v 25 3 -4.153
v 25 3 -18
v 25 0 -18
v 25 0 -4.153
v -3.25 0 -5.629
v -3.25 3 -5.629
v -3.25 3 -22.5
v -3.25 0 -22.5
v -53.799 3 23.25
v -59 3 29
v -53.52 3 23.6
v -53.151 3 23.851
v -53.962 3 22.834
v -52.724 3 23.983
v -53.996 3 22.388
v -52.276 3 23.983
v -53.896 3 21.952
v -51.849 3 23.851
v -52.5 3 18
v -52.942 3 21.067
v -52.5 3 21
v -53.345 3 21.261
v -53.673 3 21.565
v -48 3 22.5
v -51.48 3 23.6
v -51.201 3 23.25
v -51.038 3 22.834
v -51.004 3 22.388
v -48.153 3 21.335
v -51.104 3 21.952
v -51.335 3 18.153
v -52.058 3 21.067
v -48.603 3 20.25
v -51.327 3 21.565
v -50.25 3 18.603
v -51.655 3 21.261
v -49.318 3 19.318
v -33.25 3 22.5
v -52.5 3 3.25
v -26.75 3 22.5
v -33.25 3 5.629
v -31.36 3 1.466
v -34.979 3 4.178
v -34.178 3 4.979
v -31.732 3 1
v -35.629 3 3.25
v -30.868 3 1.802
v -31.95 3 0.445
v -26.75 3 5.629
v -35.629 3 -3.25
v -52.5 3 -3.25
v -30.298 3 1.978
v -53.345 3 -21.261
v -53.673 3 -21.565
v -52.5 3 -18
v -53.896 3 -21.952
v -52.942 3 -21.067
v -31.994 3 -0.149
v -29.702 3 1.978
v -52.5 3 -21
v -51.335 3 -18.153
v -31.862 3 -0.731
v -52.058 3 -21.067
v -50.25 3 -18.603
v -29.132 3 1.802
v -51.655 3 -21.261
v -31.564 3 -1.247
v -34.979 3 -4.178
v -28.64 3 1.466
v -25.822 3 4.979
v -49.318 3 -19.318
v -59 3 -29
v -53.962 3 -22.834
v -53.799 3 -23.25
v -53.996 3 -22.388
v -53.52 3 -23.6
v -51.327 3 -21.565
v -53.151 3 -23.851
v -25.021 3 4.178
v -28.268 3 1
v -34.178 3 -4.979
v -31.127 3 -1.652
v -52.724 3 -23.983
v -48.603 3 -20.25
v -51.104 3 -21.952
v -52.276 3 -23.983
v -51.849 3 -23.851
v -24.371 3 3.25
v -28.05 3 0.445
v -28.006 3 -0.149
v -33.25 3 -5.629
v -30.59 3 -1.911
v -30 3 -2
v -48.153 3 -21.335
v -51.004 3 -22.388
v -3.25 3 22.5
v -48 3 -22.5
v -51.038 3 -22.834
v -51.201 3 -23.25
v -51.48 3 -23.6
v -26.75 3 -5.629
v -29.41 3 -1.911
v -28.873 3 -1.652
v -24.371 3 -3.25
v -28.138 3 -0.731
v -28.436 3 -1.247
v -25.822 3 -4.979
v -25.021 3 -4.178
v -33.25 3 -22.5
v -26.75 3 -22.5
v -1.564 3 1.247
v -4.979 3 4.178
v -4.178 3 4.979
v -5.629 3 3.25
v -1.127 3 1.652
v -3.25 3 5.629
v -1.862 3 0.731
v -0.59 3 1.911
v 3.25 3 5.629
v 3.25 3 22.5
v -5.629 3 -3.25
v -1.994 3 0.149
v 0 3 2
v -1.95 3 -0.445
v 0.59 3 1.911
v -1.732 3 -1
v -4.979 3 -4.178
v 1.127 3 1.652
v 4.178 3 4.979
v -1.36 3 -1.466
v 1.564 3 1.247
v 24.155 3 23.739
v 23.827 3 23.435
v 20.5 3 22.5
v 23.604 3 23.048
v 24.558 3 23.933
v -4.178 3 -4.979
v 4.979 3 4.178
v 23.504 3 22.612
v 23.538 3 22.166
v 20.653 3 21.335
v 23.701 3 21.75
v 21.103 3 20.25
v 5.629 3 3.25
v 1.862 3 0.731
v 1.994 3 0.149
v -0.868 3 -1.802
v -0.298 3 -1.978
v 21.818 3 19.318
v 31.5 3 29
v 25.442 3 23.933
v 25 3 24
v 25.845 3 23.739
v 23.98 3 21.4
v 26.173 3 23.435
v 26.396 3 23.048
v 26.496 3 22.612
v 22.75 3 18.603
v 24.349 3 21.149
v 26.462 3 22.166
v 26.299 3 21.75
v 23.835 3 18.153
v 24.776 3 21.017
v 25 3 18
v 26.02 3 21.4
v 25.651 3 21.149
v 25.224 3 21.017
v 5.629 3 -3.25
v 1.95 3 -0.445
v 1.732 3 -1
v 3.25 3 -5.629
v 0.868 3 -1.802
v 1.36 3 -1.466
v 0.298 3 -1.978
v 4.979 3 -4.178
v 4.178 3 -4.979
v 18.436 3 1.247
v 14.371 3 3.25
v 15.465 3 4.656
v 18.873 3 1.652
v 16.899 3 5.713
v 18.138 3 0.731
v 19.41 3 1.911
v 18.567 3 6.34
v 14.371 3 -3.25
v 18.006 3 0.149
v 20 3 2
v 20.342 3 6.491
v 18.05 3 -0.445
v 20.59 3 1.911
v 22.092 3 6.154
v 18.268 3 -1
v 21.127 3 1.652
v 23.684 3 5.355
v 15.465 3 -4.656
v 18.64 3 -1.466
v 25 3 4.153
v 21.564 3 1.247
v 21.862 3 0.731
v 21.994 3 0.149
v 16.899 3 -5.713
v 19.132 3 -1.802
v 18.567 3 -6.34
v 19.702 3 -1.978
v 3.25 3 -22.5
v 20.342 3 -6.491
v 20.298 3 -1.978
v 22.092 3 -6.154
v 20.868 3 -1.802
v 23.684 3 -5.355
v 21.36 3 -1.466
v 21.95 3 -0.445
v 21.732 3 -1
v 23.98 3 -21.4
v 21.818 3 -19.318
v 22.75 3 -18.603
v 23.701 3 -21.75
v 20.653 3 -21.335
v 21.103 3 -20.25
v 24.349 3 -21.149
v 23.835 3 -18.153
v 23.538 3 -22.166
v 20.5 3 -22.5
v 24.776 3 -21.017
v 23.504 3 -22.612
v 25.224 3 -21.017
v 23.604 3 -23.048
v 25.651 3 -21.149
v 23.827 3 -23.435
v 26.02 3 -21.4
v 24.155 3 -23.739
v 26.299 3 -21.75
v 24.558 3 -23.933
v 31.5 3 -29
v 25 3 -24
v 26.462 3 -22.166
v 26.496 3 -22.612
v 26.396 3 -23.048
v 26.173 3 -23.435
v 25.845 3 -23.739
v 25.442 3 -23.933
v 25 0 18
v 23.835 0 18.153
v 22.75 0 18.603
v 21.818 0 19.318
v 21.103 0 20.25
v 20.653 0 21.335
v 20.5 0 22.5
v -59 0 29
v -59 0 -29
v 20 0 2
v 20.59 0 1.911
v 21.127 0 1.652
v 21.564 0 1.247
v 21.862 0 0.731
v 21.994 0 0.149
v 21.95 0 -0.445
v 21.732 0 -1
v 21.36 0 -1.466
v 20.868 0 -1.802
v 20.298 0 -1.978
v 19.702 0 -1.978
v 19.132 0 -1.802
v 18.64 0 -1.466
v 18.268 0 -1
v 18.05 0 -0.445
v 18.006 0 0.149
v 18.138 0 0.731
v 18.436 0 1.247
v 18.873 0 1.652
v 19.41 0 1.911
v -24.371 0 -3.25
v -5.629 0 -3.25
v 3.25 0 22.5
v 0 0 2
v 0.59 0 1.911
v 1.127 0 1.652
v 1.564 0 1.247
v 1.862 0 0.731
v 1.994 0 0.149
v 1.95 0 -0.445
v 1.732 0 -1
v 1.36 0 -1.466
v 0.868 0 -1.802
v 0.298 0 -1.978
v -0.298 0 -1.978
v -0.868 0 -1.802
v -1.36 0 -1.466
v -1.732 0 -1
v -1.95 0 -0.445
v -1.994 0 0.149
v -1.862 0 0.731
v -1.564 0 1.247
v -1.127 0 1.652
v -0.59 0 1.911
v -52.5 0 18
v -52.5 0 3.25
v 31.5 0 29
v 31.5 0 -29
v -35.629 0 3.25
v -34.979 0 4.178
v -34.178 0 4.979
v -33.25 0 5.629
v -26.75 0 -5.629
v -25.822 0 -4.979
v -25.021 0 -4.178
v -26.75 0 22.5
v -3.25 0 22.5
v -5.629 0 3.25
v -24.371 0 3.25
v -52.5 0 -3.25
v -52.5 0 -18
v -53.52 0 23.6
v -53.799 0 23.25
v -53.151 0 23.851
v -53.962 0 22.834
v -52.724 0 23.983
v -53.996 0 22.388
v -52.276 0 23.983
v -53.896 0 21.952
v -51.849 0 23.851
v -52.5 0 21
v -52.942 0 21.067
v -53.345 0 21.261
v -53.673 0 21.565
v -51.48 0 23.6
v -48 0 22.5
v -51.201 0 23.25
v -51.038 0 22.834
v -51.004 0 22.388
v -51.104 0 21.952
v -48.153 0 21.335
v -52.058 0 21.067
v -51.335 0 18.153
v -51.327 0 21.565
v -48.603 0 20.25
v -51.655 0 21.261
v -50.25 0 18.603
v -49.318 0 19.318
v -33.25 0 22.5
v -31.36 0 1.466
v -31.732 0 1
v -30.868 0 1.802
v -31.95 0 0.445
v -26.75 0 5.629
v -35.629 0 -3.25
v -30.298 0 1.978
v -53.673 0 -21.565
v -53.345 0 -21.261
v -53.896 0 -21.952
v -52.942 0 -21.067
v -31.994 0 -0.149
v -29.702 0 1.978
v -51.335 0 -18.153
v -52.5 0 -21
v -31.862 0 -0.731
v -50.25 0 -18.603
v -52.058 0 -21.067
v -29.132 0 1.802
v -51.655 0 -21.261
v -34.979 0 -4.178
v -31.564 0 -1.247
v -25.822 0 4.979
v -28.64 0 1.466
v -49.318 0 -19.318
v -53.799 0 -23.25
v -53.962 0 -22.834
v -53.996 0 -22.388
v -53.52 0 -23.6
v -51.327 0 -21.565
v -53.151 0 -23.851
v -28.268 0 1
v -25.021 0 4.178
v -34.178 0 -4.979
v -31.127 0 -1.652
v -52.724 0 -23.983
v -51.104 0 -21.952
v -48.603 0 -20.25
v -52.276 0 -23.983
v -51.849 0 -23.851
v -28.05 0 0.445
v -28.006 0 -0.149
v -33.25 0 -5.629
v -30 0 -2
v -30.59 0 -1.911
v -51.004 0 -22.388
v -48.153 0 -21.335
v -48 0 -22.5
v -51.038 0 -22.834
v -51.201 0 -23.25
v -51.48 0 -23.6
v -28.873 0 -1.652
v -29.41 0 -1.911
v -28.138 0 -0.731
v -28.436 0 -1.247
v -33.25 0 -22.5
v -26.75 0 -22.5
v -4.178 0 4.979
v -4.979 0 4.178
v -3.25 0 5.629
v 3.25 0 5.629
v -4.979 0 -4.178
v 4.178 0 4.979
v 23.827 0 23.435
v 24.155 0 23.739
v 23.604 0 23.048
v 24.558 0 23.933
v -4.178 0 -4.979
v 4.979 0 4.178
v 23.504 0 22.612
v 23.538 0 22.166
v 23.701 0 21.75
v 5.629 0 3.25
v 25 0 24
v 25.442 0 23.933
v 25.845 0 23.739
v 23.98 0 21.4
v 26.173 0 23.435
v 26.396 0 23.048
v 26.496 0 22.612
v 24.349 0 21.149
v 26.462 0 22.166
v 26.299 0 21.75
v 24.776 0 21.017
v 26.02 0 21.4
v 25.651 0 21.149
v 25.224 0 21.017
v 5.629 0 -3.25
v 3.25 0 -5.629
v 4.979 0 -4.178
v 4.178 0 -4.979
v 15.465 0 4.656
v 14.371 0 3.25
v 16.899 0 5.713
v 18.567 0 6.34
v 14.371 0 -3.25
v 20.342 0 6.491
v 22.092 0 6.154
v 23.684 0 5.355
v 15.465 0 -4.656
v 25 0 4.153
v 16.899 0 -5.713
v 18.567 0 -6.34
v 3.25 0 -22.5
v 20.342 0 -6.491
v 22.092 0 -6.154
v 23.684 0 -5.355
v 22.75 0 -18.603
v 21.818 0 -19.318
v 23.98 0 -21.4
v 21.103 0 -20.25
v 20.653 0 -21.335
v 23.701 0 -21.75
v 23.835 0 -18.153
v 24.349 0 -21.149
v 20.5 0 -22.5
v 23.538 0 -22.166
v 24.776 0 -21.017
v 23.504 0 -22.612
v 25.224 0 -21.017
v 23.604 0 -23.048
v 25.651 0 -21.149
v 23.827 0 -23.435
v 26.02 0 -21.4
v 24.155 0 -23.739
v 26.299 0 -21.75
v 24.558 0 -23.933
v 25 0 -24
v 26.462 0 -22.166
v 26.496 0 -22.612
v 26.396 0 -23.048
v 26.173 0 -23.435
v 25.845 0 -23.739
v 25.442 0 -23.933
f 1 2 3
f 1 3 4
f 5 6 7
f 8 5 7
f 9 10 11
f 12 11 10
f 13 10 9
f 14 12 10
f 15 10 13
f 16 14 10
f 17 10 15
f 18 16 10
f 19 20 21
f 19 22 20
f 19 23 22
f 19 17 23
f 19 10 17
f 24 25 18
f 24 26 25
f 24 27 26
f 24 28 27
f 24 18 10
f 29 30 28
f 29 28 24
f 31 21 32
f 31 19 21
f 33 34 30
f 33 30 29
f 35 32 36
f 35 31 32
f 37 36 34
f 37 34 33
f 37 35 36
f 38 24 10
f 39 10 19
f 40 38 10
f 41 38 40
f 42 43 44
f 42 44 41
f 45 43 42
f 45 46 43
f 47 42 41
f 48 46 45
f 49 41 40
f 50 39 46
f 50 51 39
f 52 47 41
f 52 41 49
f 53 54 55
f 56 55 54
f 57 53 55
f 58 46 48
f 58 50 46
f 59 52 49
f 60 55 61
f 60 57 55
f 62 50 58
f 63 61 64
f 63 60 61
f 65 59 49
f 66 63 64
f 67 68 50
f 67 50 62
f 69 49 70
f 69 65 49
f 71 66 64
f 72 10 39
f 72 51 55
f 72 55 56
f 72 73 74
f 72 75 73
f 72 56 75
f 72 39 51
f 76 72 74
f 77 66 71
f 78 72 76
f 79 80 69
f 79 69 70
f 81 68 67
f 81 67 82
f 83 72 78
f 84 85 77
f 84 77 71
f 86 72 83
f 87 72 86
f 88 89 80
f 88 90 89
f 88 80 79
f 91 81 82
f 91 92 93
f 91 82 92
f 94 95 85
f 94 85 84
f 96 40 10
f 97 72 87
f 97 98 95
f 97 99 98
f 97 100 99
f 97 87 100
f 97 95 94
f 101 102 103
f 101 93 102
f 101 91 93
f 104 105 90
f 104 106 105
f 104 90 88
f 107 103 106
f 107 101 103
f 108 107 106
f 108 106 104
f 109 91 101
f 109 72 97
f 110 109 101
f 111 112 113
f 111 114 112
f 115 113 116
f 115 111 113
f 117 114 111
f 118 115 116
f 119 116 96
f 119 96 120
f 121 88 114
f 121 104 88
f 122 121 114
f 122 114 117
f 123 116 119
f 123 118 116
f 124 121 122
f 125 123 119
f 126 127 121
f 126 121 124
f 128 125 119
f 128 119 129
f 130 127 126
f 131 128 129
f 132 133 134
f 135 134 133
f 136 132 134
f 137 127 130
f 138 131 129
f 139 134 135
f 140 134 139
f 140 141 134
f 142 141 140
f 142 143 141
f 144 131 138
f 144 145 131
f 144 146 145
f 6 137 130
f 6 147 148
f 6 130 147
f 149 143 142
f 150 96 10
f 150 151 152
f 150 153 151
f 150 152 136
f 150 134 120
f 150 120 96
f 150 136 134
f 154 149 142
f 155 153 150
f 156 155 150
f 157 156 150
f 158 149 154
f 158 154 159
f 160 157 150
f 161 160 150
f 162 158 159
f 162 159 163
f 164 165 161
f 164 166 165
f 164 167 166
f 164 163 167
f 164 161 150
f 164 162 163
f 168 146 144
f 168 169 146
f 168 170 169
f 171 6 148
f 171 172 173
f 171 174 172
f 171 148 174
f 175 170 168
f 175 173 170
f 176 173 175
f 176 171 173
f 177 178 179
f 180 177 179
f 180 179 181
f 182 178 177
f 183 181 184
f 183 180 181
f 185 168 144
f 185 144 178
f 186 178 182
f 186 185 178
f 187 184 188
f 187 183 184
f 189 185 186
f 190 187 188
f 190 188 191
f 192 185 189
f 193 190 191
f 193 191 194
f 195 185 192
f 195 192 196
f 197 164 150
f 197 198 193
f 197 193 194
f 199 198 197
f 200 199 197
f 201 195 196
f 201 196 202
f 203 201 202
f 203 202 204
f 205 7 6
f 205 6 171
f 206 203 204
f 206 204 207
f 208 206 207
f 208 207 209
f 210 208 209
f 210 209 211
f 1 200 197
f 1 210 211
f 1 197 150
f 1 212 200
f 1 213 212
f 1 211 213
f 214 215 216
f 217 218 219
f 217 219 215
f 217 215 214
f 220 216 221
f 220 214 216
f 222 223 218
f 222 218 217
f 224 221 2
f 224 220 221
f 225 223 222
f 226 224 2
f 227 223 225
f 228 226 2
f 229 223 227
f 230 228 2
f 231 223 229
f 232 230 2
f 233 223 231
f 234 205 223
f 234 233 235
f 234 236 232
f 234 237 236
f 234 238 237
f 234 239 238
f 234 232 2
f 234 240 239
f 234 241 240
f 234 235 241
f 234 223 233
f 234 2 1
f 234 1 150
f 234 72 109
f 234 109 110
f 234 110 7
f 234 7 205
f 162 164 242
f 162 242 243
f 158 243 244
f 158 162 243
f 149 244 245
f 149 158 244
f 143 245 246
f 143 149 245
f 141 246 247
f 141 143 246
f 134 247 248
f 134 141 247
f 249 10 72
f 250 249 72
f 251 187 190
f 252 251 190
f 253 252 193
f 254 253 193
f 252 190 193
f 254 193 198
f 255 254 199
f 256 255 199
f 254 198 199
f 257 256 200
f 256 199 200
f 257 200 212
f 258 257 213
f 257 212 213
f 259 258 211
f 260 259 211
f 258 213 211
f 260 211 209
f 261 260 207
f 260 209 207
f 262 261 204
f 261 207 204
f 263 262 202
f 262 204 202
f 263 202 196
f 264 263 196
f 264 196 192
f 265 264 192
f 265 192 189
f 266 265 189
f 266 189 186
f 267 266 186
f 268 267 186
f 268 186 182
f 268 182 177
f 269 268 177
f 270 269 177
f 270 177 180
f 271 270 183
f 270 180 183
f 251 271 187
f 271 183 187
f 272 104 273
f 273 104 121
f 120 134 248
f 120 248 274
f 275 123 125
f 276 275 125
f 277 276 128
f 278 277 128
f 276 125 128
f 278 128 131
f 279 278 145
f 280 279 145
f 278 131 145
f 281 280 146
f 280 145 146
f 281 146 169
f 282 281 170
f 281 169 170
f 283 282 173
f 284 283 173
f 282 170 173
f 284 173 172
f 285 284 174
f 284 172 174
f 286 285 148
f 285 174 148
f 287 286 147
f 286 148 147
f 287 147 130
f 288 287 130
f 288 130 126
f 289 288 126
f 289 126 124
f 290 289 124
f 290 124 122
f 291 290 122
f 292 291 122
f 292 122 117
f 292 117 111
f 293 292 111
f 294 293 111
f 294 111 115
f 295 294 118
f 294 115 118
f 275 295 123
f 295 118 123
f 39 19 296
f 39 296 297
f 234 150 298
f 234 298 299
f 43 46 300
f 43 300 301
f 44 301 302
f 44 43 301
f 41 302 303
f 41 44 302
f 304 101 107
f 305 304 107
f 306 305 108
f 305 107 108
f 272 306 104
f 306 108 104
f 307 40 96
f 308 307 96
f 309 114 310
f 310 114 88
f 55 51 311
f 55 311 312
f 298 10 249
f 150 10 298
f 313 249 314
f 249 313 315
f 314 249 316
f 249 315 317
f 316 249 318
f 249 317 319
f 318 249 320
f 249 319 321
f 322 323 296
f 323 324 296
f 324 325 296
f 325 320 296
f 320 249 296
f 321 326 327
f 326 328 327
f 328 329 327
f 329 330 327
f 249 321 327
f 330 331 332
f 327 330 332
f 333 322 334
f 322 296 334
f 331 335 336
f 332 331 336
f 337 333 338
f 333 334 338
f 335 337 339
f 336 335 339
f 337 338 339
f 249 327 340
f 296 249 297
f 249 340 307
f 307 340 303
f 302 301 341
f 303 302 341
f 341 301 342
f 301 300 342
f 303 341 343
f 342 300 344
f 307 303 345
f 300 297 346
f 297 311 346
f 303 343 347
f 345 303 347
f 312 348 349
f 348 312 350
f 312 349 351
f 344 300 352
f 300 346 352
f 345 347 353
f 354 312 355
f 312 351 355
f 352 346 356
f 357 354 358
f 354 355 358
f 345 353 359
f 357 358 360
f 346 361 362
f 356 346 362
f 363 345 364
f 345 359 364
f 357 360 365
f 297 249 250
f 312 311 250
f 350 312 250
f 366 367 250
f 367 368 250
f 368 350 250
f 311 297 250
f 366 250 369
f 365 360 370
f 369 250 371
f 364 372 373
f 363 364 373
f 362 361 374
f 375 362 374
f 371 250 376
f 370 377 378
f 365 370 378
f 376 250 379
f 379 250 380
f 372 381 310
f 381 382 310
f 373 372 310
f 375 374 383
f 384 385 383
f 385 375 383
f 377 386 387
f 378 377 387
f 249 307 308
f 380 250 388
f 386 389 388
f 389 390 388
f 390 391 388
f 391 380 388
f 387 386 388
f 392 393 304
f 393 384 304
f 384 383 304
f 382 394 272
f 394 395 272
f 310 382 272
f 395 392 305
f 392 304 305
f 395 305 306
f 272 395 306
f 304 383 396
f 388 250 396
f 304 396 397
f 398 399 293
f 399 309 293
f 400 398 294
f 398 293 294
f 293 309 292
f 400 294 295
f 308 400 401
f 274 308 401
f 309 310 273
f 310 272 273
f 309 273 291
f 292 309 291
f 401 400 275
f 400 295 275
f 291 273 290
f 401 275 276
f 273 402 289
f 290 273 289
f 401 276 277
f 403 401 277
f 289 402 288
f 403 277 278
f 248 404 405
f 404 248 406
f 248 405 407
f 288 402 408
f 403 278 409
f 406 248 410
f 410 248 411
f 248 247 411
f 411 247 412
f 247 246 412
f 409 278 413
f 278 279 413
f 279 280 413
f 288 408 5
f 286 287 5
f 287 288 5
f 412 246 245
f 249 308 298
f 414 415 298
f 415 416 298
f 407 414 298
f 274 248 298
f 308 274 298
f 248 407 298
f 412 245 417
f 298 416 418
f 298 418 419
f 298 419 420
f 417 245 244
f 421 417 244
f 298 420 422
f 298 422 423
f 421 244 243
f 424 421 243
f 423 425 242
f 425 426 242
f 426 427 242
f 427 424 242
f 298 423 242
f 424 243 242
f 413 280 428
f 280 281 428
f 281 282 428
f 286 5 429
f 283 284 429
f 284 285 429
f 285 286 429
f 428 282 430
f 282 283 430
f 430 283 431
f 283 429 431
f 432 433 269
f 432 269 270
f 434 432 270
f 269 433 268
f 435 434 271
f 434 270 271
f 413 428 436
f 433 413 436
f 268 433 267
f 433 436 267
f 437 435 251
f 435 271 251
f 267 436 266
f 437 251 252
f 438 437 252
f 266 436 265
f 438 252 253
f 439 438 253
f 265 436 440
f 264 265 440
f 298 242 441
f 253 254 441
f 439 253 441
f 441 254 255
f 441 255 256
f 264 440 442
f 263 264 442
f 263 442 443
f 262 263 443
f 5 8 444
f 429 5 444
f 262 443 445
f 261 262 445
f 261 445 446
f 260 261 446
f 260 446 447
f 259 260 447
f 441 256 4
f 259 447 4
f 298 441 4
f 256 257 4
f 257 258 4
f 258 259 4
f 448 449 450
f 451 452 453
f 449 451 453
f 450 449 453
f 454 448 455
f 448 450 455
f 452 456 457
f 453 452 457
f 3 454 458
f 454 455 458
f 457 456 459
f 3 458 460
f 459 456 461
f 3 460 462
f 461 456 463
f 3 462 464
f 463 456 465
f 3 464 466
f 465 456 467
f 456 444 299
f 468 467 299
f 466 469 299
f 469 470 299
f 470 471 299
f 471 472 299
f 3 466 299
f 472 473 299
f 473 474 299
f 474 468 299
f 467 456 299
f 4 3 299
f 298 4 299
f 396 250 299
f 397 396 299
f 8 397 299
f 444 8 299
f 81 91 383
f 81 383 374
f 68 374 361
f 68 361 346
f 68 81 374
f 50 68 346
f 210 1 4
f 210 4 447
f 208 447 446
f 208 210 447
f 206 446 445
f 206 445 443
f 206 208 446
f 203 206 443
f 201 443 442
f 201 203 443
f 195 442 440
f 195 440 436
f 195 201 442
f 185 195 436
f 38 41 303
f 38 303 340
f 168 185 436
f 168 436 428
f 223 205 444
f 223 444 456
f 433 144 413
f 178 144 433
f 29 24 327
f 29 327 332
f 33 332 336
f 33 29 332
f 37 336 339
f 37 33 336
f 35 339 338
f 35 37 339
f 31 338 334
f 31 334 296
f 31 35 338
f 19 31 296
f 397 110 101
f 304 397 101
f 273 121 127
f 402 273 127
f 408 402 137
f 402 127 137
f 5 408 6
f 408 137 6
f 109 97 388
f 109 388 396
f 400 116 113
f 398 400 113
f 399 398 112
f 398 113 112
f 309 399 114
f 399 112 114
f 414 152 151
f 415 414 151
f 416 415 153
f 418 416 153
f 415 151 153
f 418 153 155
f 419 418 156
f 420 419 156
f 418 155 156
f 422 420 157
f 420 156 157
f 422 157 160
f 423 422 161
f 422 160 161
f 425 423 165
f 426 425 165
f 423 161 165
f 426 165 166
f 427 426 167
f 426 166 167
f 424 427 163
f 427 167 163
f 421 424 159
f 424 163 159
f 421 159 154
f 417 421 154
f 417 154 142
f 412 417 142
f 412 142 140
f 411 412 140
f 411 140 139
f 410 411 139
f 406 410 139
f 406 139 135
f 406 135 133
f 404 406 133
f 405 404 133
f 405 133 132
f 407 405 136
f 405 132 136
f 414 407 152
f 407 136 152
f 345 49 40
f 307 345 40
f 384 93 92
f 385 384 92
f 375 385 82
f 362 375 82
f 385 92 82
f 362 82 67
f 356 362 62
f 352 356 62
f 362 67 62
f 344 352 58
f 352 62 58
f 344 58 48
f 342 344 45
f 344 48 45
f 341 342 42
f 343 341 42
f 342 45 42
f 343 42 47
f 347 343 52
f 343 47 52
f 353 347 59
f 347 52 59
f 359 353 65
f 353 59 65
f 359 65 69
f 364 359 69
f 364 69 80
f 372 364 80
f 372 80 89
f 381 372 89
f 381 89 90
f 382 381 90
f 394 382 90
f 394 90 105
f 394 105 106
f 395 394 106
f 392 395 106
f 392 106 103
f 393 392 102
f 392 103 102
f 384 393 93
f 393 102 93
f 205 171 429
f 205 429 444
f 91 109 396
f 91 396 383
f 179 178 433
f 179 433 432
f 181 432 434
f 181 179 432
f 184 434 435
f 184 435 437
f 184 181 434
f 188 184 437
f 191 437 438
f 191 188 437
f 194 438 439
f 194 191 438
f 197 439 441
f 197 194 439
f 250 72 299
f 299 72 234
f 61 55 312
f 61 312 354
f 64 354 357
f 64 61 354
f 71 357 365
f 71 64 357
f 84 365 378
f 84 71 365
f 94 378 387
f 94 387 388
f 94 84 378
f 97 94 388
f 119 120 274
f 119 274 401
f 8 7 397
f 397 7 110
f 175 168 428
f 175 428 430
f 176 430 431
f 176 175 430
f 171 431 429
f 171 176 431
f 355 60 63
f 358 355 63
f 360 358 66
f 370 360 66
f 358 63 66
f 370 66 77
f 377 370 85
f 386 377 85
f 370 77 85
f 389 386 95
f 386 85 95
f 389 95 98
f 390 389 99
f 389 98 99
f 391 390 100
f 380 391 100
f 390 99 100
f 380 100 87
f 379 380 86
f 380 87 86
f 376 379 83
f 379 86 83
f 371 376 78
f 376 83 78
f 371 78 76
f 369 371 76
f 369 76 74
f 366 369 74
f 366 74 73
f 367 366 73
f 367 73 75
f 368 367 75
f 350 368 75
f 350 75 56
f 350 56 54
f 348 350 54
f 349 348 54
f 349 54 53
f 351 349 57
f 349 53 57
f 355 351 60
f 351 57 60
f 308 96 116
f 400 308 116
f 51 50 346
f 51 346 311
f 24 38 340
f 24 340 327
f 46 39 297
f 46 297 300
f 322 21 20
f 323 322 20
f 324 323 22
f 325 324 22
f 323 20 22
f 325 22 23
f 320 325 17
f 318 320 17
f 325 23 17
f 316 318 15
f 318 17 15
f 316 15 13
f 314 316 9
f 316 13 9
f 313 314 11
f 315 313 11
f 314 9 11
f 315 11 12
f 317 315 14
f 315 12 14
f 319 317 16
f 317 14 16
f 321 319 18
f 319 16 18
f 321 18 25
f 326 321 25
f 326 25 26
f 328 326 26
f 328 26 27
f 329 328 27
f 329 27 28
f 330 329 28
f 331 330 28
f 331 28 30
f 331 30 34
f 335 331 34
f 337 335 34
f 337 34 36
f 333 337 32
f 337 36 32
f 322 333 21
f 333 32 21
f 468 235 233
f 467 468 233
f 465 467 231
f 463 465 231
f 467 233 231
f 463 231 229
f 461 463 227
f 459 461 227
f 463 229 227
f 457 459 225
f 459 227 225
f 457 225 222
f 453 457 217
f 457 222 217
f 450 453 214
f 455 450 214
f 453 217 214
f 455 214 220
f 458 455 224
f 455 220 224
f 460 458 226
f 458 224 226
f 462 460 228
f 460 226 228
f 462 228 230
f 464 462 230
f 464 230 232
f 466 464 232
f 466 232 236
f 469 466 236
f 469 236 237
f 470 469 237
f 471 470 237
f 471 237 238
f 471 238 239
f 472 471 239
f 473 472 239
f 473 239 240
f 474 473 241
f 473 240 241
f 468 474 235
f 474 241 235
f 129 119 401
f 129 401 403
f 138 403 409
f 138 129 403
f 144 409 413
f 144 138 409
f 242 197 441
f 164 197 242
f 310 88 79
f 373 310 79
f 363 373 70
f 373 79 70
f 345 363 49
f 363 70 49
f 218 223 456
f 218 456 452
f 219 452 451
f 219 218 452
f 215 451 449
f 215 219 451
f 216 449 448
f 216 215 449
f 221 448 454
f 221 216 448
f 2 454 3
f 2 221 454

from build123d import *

# Parameters (mm, degrees)
SKETCH1_R           = 5
SKETCH1_R_2         = 22.5
SKETCH1_R_3         = 15
SKETCH1_R_4         = 7.5
BOSS_EXTRUDE1_DEPTH = 3
SKETCH3_W           = 90.5
SKETCH3_H           = 58
SKETCH3_W_2         = 77.5
SKETCH3_H_2         = 45
BOSS_EXTRUDE2_DEPTH = 3
SKETCH2_R           = 1.5
SKETCH2_R_2         = 2
CUT_EXTRUDE1_DEPTH  = 3


with BuildPart() as part:
    # Sketch1 → Boss-Extrude1 (new body)
    # profile 1 of 12: a face of its own
    with BuildSketch(Plane(origin=(0, 0, 0), x_dir=(1, 0, 0), z_dir=(0, 1, 0))):
        with BuildLine():
            Line((25, 22.5), (-30, 22.5))
            ThreePointArc((-30, 22.5), (-18.572778714, 19.382172574), (-10.3125, 10.892765661))
            ThreePointArc((-10.3125, 10.892765661), (5.929270613, 13.778379803), (15, 0))
            ThreePointArc((15, 0), (20, 5), (25, 0))
            Line((25, 0), (25, 22.5))
        make_face()
    # profile 2 of 12: a face of its own
    with BuildSketch(Plane(origin=(0, 0, 0), x_dir=(1, 0, 0), z_dir=(0, 1, 0))):
        with BuildLine():
            ThreePointArc((-10.3125, -10.892765661), (-18.572778714, -19.382172574), (-30, -22.5))
            Line((-30, -22.5), (25, -22.5))
            Line((25, -22.5), (25, 0))
            ThreePointArc((25, 0), (20, -5), (15, 0))
            ThreePointArc((15, 0), (5.929270613, -13.778379803), (-10.3125, -10.892765661))
        make_face()
    # profile 3 of 12: a face of its own
    with BuildSketch(Plane(origin=(0, 0, 0), x_dir=(1, 0, 0), z_dir=(0, 1, 0))):
        with BuildLine():
            Line((-30, 22.5), (-52.5, 22.5))
            Line((-52.5, 22.5), (-52.5, 6.7e-08))
            ThreePointArc((-52.5, 6.7e-08), (-45.909902553, 15.9099026), (-30, 22.5))
        make_face()
    # profile 4 of 12: a face of its own
    with BuildSketch(Plane(origin=(0, 0, 0), x_dir=(1, 0, 0), z_dir=(0, 1, 0))):
        with BuildLine():
            ThreePointArc((-30, -22.5), (-45.9099026, -15.909902553), (-52.5, 6.7e-08))
            Line((-52.5, 6.7e-08), (-52.5, -22.5))
            Line((-52.5, -22.5), (-30, -22.5))
        make_face()
    # profile 5 of 12: a face of its own
    with BuildSketch(Plane(origin=(0, 0, 0), x_dir=(1, 0, 0), z_dir=(0, 1, 0))):
        with Locations((20, 0)):
            Circle(SKETCH1_R)
    # profile 6 of 12: a face of its own
    with BuildSketch(Plane(origin=(0, 0, 0), x_dir=(1, 0, 0), z_dir=(0, 1, 0))):
        with Locations((-30, 0)):
            Circle(SKETCH1_R_2)
    # profile 7 of 12: a face of its own
    with BuildSketch(Plane(origin=(0, 0, 0), x_dir=(1, 0, 0), z_dir=(0, 1, 0))):
        Circle(SKETCH1_R_3)
        Circle(SKETCH1_R_4, mode=Mode.SUBTRACT)
    # profile 8 of 12: a face of its own
    with BuildSketch(Plane(origin=(0, 0, 0), x_dir=(1, 0, 0), z_dir=(0, 1, 0))):
        Circle(SKETCH1_R_4)
    # profile 9 of 12: a face of its own
    with BuildSketch(Plane(origin=(0, 0, 0), x_dir=(1, 0, 0), z_dir=(0, 1, 0))):
        Circle(SKETCH1_R_3)
    # profile 10 of 12: a face of its own
    with BuildSketch(Plane(origin=(0, 0, 0), x_dir=(1, 0, 0), z_dir=(0, 1, 0))):
        with Locations((-30, 0)):
            Circle(SKETCH1_R_2)
    # profile 11 of 12: a face of its own
    with BuildSketch(Plane(origin=(0, 0, 0), x_dir=(1, 0, 0), z_dir=(0, 1, 0))):
        with Locations((-30, 0)):
            Circle(SKETCH1_R_2)
    # profile 12 of 12: a face of its own
    with BuildSketch(Plane(origin=(0, 0, 0), x_dir=(1, 0, 0), z_dir=(0, 1, 0))):
        Circle(SKETCH1_R_3)
    extrude(amount=BOSS_EXTRUDE1_DEPTH)

    # Sketch3 → Boss-Extrude2 (add)
    with BuildSketch(Plane(origin=(0, 3, 0), x_dir=(1, 0, 0), z_dir=(0, 1, 0))):
        with Locations((-13.75, 0)):
            Rectangle(SKETCH3_W, SKETCH3_H)
        with Locations((-13.75, 0)):
            Rectangle(SKETCH3_W_2, SKETCH3_H_2, mode=Mode.SUBTRACT)
    extrude(amount=-BOSS_EXTRUDE2_DEPTH)

    # Sketch2 → Cut-Extrude1 (cut)
    with BuildSketch(Plane(origin=(0, 3, 0), x_dir=(1, 0, 0), z_dir=(0, 1, 0))):
        with BuildLine():
            Line((-26.75, 22.5), (-26.75, 5.629165125))
            ThreePointArc((-26.75, 5.629165125), (-25.403805922, 4.596194078), (-24.370834875, 3.25))
            Line((-24.370834875, 3.25), (-5.629165125, 3.25))
            ThreePointArc((-5.629165125, 3.25), (-4.596194078, 4.596194078), (-3.25, 5.629165125))
            Line((-3.25, 5.629165125), (-3.25, 22.5))
            Line((-3.25, 22.5), (-26.75, 22.5))
        make_face()
        with BuildLine():
            Line((-5.629165125, -3.25), (-24.370834875, -3.25))
            ThreePointArc((-24.370834875, -3.25), (-25.403805922, -4.596194078), (-26.75, -5.629165125))
            Line((-26.75, -5.629165125), (-26.75, -22.5))
            Line((-26.75, -22.5), (-3.25, -22.5))
            Line((-3.25, -22.5), (-3.25, -5.629165125))
            ThreePointArc((-3.25, -5.629165125), (-4.596194078, -4.596194078), (-5.629165125, -3.25))
        make_face()
        with BuildLine():
            ThreePointArc((-48, -22.5), (-49.318019485, -19.318019485), (-52.5, -18))
            Line((-52.5, -18), (-52.5, -3.25))
            Line((-52.5, -3.25), (-35.629165125, -3.25))
            ThreePointArc((-35.629165125, -3.25), (-34.596194078, -4.596194078), (-33.25, -5.629165125))
            Line((-33.25, -5.629165125), (-33.25, -22.5))
            Line((-33.25, -22.5), (-48, -22.5))
        make_face()
        with BuildLine():
            ThreePointArc((25, 4.153311931), (19.449586247, 6.47665382), (14.370834875, 3.25))
            Line((14.370834875, 3.25), (5.629165125, 3.25))
            ThreePointArc((5.629165125, 3.25), (4.596194078, 4.596194078), (3.25, 5.629165125))
            Line((3.25, 5.629165125), (3.25, 22.5))
            Line((3.25, 22.5), (20.5, 22.5))
            ThreePointArc((20.5, 22.5), (21.818019485, 19.318019485), (25, 18))
            Line((25, 18), (25, 4.153311931))
        make_face()
        with BuildLine():
            ThreePointArc((14.370834875, -3.25), (19.449586247, -6.47665382), (25, -4.153311931))
            Line((25, -4.153311931), (25, -18))
            ThreePointArc((25, -18), (21.818019485, -19.318019485), (20.5, -22.5))
            Line((20.5, -22.5), (3.25, -22.5))
            Line((3.25, -22.5), (3.25, -5.629165125))
            ThreePointArc((3.25, -5.629165125), (4.596194078, -4.596194078), (5.629165125, -3.25))
            Line((5.629165125, -3.25), (14.370834875, -3.25))
        make_face()
        with BuildLine():
            Line((-52.5, 3.25), (-52.5, 18))
            ThreePointArc((-52.5, 18), (-49.318019485, 19.318019485), (-48, 22.5))
            Line((-48, 22.5), (-33.25, 22.5))
            Line((-33.25, 22.5), (-33.25, 5.629165125))
            ThreePointArc((-33.25, 5.629165125), (-34.596194078, 4.596194078), (-35.629165125, 3.25))
            Line((-35.629165125, 3.25), (-52.5, 3.25))
        make_face()
        with Locations(Location((-52.5, 22.5, 0), (0, 0, 270))):
            Circle(SKETCH2_R)
        with Locations(Location((-30, 0, 0), (0, 0, 90))):
            Circle(SKETCH2_R_2)
        with Locations(Location((0, 0, 0), (0, 0, 270))):
            Circle(SKETCH2_R_2)
        with Locations(Location((25, 22.5, 0), (0, 0, 90))):
            Circle(SKETCH2_R)
        with Locations(Location((20, 0, 0), (0, 0, 270))):
            Circle(SKETCH2_R_2)
        with Locations(Location((25, -22.5, 0), (0, 0, 270))):
            Circle(SKETCH2_R)
        with Locations(Location((-52.5, -22.5, 0), (0, 0, 90))):
            Circle(SKETCH2_R)
    extrude(amount=-CUT_EXTRUDE1_DEPTH, mode=Mode.SUBTRACT)


solid = part.part
